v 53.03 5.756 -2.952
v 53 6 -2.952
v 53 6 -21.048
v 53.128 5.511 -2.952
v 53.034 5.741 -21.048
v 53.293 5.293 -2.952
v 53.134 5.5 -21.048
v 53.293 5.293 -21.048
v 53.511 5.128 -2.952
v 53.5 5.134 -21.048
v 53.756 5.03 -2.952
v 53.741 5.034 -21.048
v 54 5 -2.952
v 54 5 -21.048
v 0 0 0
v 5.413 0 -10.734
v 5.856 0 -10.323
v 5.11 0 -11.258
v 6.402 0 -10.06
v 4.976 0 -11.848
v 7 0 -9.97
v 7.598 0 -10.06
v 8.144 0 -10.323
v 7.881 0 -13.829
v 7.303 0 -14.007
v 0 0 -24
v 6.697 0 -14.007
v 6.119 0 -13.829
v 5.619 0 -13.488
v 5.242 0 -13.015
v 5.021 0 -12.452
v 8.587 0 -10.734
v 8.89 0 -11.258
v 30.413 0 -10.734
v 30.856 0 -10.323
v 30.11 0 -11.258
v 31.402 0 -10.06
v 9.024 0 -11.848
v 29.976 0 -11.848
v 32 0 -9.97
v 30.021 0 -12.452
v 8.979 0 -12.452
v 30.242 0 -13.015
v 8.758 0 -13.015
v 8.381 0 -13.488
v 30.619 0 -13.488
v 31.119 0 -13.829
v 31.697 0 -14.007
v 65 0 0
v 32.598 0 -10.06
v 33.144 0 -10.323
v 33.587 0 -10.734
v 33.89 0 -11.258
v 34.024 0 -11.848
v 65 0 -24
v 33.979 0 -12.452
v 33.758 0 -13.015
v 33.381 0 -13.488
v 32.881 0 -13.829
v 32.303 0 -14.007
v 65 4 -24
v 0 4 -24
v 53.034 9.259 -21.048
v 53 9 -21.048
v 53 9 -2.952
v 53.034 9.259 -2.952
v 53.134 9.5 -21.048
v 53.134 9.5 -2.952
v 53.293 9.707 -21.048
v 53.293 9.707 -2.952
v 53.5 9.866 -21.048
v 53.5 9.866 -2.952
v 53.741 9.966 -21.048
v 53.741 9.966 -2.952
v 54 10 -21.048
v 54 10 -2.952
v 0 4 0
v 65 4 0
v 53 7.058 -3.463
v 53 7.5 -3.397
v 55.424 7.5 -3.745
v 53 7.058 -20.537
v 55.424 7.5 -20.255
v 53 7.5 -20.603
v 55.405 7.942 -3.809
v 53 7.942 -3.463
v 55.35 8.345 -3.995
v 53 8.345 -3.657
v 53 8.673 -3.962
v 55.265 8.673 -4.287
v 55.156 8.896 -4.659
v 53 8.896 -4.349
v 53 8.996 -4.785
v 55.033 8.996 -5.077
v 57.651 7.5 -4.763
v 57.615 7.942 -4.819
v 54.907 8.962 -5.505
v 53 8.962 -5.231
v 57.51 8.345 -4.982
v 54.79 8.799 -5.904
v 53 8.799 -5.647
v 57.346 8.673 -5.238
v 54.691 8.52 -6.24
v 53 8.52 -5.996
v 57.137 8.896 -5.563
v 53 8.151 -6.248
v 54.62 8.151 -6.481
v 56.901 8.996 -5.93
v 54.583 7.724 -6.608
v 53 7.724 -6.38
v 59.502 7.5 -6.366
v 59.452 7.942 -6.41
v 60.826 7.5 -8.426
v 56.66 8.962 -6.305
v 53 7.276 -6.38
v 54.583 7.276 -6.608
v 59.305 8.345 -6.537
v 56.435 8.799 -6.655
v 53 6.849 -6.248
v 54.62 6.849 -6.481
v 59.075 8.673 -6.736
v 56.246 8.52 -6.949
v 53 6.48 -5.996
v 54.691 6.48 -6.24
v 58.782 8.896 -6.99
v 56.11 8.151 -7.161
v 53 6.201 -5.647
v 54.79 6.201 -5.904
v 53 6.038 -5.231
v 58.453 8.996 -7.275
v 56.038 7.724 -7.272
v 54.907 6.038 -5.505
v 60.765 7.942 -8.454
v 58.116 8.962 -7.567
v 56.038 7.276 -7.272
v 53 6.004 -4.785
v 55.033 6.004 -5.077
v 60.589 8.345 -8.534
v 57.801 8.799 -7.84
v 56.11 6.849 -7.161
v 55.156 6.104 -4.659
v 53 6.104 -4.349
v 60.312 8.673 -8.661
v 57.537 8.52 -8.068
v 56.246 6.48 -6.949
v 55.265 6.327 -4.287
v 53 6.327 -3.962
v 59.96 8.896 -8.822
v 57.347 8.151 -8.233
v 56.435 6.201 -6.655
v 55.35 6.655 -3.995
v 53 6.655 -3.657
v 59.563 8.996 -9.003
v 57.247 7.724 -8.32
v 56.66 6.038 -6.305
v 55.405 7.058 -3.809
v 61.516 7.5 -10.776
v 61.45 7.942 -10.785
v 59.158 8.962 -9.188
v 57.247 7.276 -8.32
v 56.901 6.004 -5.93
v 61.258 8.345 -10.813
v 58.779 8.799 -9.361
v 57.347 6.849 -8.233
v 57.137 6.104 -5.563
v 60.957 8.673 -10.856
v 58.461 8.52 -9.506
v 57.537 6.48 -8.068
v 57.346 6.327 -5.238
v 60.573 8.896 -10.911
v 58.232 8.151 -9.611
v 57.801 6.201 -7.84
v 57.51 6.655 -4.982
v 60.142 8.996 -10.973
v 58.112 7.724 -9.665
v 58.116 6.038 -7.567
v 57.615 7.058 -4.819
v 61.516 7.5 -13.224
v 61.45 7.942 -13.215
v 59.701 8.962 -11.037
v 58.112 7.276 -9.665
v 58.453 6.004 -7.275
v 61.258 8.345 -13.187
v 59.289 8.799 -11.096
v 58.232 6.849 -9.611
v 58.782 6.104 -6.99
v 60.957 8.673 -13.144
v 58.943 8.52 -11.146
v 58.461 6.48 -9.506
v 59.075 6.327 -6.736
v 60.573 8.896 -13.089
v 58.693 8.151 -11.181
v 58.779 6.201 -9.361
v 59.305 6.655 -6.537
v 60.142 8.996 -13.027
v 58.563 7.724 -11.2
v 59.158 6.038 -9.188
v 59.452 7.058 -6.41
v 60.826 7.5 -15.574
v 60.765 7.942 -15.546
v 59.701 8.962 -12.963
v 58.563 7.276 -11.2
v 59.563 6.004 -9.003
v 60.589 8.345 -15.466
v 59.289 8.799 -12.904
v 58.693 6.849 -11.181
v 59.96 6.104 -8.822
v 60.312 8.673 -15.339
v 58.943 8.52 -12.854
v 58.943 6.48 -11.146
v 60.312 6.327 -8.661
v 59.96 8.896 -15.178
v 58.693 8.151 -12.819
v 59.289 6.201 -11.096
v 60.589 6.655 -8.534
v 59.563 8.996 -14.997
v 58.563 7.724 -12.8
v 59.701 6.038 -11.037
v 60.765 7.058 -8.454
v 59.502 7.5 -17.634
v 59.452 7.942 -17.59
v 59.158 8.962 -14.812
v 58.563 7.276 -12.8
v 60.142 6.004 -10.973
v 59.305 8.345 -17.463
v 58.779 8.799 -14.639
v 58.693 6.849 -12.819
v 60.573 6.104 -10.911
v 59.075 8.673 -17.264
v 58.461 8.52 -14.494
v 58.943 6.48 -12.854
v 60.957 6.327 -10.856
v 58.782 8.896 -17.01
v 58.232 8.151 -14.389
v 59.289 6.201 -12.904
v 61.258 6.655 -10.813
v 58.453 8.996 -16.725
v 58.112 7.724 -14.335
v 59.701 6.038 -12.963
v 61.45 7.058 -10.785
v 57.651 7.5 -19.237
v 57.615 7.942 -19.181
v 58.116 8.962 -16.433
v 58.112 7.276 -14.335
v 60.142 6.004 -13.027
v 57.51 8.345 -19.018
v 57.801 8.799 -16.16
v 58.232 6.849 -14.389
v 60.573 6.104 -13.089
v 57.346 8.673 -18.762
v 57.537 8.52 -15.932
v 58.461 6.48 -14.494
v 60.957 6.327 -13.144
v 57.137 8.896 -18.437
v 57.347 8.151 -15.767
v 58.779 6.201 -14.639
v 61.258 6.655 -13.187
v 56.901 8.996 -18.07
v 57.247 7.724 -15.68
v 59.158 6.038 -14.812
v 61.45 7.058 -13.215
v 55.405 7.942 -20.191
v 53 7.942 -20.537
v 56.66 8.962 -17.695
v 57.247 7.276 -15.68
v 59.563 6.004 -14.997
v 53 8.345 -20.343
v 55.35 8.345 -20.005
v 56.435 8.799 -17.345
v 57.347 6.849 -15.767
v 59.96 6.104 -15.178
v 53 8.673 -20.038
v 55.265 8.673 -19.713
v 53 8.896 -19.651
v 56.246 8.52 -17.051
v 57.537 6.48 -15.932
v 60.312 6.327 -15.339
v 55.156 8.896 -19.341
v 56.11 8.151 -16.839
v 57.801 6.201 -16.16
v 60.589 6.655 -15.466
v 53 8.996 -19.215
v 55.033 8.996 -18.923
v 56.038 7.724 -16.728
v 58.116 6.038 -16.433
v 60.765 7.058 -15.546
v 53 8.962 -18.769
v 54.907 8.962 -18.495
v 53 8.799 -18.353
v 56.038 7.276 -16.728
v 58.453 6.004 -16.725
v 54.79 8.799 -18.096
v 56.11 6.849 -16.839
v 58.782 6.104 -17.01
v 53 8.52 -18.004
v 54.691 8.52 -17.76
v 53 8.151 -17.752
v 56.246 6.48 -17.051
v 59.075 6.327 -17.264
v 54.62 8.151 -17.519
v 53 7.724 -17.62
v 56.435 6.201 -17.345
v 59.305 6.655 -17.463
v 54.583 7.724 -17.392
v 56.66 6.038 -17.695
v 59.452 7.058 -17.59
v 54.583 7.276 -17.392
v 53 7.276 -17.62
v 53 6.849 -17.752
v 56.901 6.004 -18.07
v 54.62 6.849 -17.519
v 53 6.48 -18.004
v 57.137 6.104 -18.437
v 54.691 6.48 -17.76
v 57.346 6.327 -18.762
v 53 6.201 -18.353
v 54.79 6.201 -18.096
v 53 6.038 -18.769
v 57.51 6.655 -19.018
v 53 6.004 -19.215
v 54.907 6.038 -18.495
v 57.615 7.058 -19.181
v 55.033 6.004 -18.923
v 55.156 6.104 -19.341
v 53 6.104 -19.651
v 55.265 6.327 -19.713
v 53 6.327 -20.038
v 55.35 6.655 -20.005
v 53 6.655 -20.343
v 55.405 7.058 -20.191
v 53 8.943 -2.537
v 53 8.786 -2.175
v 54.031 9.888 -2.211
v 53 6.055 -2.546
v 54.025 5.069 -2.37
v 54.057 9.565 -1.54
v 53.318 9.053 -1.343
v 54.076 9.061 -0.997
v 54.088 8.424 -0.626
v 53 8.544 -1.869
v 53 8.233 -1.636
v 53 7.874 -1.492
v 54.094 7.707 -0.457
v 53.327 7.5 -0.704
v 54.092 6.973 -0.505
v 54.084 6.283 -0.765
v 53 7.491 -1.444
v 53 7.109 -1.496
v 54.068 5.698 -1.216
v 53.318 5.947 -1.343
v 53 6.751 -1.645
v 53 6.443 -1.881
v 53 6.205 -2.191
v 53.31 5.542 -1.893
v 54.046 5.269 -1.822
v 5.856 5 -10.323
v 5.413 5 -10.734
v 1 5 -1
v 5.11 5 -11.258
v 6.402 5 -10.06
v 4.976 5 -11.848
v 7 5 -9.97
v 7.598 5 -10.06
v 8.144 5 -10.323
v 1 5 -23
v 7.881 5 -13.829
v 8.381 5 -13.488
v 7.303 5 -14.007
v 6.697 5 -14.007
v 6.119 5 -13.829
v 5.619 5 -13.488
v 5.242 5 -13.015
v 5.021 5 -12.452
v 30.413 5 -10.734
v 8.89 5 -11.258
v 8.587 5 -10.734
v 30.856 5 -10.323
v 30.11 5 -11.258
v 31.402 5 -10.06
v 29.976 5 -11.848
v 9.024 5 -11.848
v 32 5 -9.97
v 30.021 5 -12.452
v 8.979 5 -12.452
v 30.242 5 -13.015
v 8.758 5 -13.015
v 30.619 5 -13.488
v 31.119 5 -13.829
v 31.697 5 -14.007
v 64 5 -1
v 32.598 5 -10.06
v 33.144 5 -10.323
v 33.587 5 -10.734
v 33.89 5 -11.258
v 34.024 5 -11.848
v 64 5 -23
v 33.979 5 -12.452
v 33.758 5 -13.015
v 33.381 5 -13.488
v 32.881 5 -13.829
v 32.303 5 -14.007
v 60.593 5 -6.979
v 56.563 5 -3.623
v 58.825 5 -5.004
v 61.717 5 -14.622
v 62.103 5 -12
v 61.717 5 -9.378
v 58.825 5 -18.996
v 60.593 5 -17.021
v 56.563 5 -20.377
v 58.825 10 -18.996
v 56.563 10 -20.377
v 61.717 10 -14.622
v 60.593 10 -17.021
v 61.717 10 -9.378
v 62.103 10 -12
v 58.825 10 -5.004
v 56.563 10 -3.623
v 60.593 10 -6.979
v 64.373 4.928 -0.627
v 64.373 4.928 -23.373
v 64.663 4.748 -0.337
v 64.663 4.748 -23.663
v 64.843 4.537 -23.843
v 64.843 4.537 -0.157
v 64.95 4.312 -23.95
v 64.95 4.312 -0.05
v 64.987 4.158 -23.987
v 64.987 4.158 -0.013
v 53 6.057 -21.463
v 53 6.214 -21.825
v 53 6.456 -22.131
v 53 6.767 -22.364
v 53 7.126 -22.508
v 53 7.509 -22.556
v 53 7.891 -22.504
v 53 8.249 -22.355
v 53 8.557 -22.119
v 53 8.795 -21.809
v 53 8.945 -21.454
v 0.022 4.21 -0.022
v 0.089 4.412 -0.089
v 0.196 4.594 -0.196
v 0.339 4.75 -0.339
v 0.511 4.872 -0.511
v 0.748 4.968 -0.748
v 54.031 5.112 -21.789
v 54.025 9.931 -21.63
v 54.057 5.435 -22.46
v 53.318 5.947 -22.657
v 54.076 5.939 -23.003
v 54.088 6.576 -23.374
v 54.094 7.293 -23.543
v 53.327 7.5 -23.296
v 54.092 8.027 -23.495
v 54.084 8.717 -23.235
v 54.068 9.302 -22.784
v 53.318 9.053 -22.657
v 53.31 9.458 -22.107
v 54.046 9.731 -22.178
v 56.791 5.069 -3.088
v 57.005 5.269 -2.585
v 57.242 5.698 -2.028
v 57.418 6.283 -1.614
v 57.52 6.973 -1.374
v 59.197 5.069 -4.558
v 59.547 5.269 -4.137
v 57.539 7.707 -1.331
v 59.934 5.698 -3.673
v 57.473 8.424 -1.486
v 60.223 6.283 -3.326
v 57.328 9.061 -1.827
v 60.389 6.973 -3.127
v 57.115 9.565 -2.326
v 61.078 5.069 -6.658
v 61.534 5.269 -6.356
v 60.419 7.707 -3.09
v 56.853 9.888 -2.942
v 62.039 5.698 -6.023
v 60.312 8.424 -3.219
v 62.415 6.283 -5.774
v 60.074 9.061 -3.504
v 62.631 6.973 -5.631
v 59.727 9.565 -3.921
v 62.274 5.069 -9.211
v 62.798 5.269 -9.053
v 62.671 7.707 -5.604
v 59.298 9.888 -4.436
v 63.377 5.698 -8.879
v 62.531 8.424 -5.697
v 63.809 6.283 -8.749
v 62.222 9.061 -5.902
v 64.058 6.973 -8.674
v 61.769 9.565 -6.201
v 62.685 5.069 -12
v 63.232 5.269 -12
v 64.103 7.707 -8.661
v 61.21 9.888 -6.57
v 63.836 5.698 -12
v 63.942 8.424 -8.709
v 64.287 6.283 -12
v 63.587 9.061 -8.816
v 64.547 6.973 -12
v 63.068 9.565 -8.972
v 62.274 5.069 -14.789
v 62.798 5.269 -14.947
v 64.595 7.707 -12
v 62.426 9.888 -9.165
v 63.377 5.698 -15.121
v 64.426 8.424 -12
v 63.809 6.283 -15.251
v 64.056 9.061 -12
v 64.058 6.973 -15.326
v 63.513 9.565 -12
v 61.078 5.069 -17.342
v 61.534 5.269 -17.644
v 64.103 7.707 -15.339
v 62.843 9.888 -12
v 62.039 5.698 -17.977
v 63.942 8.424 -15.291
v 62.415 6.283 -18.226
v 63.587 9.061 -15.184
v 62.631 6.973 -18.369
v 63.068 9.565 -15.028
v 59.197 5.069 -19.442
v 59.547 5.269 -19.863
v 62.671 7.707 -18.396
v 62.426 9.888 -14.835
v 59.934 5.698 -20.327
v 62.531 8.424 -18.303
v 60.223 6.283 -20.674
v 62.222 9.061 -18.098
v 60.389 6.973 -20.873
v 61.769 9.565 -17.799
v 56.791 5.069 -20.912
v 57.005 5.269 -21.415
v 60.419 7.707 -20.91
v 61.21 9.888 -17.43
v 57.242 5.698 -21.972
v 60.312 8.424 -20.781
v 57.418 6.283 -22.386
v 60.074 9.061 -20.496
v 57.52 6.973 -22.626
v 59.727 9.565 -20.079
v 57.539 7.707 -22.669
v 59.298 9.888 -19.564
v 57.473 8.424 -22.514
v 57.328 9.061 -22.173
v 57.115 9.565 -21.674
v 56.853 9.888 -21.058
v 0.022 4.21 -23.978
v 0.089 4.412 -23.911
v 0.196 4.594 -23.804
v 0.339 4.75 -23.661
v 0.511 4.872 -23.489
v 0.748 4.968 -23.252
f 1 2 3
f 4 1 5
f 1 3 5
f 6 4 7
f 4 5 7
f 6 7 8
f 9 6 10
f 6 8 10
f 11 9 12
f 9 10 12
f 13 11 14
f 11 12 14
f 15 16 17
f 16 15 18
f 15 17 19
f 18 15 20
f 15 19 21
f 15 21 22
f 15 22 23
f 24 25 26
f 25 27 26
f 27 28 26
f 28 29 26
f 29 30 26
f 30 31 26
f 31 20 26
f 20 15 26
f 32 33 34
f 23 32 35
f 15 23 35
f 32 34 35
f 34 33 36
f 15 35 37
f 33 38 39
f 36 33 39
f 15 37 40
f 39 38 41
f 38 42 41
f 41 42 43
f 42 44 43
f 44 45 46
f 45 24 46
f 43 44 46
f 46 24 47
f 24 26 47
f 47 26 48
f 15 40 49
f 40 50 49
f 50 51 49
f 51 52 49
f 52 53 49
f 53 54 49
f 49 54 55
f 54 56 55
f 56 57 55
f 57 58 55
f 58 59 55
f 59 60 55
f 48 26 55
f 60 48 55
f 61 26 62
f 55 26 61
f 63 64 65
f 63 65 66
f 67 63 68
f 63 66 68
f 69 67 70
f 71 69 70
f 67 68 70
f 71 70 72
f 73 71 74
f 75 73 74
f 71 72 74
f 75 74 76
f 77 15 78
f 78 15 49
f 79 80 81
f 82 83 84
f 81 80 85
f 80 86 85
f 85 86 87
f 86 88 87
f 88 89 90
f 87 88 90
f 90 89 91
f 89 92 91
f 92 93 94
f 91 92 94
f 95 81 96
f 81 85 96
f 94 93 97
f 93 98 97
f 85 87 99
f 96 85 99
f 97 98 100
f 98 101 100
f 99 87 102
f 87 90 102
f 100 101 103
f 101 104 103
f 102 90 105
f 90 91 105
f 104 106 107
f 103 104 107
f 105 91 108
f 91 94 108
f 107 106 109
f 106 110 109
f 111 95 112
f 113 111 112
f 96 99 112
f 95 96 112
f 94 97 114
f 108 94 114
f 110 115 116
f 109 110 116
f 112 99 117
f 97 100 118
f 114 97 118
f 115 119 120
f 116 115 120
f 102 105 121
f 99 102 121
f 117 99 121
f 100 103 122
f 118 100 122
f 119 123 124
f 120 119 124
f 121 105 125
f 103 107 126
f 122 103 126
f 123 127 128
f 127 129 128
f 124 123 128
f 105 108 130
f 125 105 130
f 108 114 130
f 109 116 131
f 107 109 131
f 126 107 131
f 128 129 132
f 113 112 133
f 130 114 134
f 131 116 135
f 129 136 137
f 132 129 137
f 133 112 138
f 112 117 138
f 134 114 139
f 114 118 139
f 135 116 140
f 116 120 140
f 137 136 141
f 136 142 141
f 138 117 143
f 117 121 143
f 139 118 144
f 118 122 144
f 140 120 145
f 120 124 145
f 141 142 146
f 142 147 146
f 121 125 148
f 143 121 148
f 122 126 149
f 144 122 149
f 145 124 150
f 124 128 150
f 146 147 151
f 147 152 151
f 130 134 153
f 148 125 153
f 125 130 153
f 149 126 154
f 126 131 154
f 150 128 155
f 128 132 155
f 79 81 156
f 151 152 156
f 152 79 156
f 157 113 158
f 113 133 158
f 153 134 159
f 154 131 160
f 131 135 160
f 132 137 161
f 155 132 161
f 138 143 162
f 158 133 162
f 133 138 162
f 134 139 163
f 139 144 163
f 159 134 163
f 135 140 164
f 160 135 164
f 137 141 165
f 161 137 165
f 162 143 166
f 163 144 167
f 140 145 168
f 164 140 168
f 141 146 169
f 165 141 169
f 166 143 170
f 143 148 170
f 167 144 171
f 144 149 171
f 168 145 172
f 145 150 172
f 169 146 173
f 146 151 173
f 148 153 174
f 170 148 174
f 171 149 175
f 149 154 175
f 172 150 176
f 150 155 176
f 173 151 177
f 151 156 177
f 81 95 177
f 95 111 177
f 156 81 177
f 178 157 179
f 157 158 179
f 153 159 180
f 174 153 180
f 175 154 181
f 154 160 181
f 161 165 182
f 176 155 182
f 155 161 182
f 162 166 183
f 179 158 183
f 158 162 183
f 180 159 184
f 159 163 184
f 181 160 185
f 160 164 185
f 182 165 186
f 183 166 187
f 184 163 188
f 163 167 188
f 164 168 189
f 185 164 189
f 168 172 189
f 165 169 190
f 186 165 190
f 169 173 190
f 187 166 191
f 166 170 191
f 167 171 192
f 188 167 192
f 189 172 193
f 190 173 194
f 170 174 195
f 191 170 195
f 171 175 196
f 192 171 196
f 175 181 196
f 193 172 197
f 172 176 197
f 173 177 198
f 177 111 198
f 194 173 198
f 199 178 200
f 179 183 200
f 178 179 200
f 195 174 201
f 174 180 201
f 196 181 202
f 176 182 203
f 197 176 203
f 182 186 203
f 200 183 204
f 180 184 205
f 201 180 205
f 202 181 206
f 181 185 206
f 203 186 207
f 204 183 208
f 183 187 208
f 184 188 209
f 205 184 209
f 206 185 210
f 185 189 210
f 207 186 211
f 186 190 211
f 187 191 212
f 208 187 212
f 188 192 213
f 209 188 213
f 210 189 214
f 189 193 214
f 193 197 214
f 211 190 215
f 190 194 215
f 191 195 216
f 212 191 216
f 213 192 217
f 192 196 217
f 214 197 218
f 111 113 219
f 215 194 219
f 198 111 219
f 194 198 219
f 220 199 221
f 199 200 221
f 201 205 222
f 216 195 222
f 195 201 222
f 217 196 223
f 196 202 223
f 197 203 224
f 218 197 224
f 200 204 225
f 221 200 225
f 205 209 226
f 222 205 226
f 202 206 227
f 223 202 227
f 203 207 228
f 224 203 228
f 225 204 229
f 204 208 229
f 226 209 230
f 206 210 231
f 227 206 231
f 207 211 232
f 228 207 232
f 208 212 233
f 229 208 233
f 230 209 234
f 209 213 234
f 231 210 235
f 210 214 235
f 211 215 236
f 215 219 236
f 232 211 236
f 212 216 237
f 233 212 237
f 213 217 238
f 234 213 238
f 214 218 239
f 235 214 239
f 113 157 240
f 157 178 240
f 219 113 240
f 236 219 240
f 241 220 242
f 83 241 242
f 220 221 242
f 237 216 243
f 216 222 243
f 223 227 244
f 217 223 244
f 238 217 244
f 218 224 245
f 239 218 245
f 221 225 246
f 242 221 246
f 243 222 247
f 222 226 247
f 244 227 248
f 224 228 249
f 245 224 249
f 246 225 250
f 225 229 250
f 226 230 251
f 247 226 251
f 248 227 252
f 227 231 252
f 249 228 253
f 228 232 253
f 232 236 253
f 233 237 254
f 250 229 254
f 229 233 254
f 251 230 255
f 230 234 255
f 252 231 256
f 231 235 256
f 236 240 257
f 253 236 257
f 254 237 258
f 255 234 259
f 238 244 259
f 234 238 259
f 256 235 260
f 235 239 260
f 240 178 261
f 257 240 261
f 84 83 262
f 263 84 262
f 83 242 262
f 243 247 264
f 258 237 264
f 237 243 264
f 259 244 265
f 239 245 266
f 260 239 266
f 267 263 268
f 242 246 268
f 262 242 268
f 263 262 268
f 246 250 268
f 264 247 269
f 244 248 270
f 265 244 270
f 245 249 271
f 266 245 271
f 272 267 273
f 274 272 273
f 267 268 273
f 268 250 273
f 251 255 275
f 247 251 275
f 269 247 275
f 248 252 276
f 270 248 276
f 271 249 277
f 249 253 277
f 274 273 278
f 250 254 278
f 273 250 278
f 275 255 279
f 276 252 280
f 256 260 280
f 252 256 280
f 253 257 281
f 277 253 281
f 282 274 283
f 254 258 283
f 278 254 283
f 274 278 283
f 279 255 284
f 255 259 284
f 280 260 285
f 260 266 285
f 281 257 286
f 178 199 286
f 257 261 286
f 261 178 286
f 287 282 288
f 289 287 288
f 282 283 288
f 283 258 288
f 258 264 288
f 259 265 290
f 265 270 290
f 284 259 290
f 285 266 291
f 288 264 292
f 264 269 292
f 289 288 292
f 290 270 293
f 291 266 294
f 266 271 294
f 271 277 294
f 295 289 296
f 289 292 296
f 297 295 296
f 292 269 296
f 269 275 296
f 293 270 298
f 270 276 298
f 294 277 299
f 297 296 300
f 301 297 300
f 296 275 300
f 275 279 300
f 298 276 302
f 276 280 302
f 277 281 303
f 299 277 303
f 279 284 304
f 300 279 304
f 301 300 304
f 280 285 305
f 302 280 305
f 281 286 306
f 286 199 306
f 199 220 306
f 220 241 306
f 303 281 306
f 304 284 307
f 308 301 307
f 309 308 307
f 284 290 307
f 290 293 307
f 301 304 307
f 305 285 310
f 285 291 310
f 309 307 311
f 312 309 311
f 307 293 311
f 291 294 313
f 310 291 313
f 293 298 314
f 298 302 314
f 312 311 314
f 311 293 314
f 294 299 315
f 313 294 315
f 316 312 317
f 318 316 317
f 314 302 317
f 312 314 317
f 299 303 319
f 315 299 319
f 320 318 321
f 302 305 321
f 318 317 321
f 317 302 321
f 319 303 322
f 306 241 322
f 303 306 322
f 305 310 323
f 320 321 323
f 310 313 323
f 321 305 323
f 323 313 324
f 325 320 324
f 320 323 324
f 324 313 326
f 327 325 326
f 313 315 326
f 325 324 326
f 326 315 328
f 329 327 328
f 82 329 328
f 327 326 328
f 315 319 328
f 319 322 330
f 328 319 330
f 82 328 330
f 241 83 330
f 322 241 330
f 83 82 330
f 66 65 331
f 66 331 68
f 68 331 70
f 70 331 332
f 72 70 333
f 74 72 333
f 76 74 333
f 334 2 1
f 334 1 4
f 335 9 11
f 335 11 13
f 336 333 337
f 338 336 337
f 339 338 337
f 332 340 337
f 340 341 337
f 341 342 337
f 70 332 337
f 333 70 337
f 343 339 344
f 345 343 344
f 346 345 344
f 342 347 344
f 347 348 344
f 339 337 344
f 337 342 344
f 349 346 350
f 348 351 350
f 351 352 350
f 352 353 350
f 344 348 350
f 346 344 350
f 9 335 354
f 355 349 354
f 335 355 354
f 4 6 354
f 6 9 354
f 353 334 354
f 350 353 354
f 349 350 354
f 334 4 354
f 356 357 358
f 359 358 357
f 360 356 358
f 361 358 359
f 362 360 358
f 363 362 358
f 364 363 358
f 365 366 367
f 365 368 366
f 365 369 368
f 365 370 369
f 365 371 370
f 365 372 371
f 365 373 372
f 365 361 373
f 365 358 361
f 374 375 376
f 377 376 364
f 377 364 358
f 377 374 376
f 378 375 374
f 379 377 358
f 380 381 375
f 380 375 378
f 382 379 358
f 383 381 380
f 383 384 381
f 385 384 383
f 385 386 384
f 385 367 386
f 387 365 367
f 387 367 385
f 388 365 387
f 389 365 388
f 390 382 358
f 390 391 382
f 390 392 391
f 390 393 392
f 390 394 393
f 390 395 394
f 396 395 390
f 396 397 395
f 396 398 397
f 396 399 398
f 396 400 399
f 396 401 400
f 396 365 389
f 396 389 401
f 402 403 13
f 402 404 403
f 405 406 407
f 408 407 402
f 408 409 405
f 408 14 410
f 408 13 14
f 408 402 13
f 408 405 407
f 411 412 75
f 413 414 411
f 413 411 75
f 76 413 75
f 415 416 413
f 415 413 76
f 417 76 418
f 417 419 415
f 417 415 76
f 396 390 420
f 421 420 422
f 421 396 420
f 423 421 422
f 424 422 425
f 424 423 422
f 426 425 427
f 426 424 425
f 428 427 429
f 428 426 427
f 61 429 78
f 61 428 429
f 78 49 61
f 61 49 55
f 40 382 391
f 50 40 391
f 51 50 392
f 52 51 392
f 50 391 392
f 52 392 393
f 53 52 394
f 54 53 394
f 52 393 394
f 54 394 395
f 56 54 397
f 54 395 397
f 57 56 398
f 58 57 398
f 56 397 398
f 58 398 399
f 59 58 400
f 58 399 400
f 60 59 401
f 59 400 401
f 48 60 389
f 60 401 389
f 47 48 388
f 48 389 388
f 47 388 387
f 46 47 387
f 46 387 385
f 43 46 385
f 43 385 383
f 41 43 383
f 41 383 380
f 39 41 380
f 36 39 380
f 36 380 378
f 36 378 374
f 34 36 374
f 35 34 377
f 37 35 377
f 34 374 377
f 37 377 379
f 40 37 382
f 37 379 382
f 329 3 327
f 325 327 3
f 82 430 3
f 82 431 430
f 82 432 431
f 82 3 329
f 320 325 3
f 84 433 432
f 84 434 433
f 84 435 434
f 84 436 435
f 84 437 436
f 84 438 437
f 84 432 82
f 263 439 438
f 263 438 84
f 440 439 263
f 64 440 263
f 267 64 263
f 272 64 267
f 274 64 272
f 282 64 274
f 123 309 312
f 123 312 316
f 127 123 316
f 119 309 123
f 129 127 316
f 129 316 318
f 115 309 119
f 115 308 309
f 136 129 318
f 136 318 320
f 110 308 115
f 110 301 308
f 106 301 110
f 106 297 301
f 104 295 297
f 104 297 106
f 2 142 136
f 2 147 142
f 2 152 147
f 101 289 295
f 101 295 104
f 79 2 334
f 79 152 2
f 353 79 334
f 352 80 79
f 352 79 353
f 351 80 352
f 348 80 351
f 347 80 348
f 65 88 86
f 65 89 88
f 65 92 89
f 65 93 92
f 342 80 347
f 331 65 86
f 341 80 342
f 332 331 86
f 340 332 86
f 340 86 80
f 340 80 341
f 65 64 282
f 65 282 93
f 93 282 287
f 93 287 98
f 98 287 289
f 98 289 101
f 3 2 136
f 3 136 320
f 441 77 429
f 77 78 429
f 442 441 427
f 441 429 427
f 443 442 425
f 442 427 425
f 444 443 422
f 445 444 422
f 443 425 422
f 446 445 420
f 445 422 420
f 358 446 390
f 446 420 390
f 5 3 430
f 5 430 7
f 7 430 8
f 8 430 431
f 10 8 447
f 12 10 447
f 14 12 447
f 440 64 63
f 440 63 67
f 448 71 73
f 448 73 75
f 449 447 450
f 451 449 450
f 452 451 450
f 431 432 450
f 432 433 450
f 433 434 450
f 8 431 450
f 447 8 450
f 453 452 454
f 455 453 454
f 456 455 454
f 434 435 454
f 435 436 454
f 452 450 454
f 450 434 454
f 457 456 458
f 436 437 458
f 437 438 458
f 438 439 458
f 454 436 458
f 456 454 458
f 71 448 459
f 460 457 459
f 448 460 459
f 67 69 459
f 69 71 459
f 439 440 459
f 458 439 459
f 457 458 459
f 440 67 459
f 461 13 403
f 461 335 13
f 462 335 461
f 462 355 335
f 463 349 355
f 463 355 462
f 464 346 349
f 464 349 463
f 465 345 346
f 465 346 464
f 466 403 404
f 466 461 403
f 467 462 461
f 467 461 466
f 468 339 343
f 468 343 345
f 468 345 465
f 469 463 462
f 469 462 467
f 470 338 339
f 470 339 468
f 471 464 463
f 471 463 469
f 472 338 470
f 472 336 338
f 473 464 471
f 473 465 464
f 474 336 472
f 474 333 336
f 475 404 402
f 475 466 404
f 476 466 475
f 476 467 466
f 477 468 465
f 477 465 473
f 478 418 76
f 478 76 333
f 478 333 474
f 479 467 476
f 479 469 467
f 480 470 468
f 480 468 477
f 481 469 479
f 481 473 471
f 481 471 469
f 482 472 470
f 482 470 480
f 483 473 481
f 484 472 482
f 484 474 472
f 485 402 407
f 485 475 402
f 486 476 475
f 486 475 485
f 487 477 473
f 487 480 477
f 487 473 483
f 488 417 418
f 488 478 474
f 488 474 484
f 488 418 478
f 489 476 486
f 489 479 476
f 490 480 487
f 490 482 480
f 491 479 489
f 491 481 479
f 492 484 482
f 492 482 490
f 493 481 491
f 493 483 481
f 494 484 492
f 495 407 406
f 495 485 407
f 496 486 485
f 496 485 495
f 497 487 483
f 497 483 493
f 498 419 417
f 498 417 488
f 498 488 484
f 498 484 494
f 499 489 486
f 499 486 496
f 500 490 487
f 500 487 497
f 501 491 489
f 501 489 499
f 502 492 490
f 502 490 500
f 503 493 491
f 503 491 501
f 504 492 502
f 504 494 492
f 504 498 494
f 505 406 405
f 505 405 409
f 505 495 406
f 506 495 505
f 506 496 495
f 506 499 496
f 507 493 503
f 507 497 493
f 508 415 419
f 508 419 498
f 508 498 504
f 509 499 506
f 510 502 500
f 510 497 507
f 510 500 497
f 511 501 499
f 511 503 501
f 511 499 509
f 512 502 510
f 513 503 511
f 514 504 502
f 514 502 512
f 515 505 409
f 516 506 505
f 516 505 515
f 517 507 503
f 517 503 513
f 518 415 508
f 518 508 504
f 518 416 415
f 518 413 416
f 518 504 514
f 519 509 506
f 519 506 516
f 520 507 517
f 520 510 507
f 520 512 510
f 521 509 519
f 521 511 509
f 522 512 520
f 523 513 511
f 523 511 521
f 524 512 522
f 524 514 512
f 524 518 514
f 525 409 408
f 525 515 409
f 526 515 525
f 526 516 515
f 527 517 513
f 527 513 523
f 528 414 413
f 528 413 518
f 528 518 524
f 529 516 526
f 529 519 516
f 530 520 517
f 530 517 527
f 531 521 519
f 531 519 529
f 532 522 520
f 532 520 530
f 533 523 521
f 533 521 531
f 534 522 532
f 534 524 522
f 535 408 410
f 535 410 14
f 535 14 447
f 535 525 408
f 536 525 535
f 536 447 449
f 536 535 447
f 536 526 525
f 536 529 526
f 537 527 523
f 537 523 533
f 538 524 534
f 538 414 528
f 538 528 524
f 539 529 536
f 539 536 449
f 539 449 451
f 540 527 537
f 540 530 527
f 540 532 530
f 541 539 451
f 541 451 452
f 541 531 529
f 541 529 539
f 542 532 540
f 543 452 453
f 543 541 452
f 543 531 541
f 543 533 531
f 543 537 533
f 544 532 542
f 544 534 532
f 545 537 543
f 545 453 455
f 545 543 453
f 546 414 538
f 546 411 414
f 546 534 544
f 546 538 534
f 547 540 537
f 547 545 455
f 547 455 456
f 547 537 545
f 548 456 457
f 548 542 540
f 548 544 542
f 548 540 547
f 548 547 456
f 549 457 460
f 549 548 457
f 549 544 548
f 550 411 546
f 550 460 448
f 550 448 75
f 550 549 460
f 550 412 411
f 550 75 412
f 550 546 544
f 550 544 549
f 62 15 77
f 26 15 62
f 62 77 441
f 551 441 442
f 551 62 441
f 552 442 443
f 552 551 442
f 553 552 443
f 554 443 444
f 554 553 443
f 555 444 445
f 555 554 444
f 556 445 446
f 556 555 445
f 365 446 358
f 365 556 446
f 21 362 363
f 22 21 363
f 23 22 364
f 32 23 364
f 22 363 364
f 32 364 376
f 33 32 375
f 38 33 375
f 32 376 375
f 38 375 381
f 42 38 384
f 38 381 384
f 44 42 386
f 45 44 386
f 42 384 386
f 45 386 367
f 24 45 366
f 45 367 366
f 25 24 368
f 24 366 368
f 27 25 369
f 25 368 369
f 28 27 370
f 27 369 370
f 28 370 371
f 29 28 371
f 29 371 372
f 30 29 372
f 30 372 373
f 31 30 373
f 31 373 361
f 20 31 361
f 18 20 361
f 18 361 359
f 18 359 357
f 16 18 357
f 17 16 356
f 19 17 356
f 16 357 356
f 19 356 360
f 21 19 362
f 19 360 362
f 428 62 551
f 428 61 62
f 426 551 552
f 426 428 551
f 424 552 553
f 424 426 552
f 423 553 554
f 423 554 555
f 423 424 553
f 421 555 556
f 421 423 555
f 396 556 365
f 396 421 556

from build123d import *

# Parameters (mm, degrees)
SKETCH1_W           = 65
SKETCH1_H           = 24
BOSS_EXTRUDE1_DEPTH = 5
REVOLVE1_OUTLINE_R  = 1.5
REVOLVE1_ANGLE      = 180
SKETCH4_R           = 2.03
CUT_EXTRUDE1_DEPTH  = 5
FILLET1_R           = 1
FILLET2_R           = 1


# Read off the part's stored shape, not the designer's step: Revolve1
with BuildPart() as part:
    # Sketch1 → Boss-Extrude1 (new body)
    with BuildSketch(Plane(origin=(0, 0, 0), x_dir=(1, 0, 0), z_dir=(0, 1, 0))):
        with Locations((32.5, 12)):
            Rectangle(SKETCH1_W, SKETCH1_H)
    extrude(amount=BOSS_EXTRUDE1_DEPTH)

    # Sketch4 → Cut-Extrude1 (cut)
    with BuildSketch(Plane(origin=(0, 5, 0), x_dir=(1, 0, 0), z_dir=(0, 1, 0))):
        with Locations(Location((32, 12, 0), (0, 0, 270))):
            Circle(SKETCH4_R)
        with Locations(Location((7, 12, 0), (0, 0, 270))):
            Circle(SKETCH4_R)
    extrude(amount=-CUT_EXTRUDE1_DEPTH, mode=Mode.SUBTRACT)

    # Fillet2
    fillet2_edges = [part.edges().sort_by_distance(p)[0] for p in [
        (65, 5, -12),
        (32.5, 5, 0),
        (0, 5, -12),
        (32.5, 5, -24),
    ]]
    fillet(fillet2_edges, radius=FILLET2_R)


with BuildPart() as body_2:
    # Revolve1 outline → Revolve1 (revolve)
    with BuildSketch(Plane(origin=(53, 0, -12), x_dir=(0, 0, 1), z_dir=(-1, 0, 0))):
        with BuildLine():
            Line((0, 5), (9.10321303, 5))
            ThreePointArc((9.10321303, 5), (11.60321303, 7.5), (9.10321303, 10))
            Line((9.10321303, 10), (0, 10))
            Line((0, 10), (0, 5))
        make_face()
        with Locations((7.10321303, 7.5)):
            Circle(REVOLVE1_OUTLINE_R, mode=Mode.SUBTRACT)
    revolve(axis=Axis((53, 0, -12), (0, 1, 0)), revolution_arc=REVOLVE1_ANGLE)

    # Fillet1
    fillet1_edges = [body_2.edges().sort_by_distance(p)[0] for p in [
        (53, 10, -12),
        (53, 5, -12),
        (53, 7.5, -23.60321303),
        (53, 7.5, -0.39678697),
    ]]
    fillet(fillet1_edges, radius=FILLET1_R - 0.0001)  # a hair under: the kernel refuses the full size


solid = Compound([part.part, body_2.part])
